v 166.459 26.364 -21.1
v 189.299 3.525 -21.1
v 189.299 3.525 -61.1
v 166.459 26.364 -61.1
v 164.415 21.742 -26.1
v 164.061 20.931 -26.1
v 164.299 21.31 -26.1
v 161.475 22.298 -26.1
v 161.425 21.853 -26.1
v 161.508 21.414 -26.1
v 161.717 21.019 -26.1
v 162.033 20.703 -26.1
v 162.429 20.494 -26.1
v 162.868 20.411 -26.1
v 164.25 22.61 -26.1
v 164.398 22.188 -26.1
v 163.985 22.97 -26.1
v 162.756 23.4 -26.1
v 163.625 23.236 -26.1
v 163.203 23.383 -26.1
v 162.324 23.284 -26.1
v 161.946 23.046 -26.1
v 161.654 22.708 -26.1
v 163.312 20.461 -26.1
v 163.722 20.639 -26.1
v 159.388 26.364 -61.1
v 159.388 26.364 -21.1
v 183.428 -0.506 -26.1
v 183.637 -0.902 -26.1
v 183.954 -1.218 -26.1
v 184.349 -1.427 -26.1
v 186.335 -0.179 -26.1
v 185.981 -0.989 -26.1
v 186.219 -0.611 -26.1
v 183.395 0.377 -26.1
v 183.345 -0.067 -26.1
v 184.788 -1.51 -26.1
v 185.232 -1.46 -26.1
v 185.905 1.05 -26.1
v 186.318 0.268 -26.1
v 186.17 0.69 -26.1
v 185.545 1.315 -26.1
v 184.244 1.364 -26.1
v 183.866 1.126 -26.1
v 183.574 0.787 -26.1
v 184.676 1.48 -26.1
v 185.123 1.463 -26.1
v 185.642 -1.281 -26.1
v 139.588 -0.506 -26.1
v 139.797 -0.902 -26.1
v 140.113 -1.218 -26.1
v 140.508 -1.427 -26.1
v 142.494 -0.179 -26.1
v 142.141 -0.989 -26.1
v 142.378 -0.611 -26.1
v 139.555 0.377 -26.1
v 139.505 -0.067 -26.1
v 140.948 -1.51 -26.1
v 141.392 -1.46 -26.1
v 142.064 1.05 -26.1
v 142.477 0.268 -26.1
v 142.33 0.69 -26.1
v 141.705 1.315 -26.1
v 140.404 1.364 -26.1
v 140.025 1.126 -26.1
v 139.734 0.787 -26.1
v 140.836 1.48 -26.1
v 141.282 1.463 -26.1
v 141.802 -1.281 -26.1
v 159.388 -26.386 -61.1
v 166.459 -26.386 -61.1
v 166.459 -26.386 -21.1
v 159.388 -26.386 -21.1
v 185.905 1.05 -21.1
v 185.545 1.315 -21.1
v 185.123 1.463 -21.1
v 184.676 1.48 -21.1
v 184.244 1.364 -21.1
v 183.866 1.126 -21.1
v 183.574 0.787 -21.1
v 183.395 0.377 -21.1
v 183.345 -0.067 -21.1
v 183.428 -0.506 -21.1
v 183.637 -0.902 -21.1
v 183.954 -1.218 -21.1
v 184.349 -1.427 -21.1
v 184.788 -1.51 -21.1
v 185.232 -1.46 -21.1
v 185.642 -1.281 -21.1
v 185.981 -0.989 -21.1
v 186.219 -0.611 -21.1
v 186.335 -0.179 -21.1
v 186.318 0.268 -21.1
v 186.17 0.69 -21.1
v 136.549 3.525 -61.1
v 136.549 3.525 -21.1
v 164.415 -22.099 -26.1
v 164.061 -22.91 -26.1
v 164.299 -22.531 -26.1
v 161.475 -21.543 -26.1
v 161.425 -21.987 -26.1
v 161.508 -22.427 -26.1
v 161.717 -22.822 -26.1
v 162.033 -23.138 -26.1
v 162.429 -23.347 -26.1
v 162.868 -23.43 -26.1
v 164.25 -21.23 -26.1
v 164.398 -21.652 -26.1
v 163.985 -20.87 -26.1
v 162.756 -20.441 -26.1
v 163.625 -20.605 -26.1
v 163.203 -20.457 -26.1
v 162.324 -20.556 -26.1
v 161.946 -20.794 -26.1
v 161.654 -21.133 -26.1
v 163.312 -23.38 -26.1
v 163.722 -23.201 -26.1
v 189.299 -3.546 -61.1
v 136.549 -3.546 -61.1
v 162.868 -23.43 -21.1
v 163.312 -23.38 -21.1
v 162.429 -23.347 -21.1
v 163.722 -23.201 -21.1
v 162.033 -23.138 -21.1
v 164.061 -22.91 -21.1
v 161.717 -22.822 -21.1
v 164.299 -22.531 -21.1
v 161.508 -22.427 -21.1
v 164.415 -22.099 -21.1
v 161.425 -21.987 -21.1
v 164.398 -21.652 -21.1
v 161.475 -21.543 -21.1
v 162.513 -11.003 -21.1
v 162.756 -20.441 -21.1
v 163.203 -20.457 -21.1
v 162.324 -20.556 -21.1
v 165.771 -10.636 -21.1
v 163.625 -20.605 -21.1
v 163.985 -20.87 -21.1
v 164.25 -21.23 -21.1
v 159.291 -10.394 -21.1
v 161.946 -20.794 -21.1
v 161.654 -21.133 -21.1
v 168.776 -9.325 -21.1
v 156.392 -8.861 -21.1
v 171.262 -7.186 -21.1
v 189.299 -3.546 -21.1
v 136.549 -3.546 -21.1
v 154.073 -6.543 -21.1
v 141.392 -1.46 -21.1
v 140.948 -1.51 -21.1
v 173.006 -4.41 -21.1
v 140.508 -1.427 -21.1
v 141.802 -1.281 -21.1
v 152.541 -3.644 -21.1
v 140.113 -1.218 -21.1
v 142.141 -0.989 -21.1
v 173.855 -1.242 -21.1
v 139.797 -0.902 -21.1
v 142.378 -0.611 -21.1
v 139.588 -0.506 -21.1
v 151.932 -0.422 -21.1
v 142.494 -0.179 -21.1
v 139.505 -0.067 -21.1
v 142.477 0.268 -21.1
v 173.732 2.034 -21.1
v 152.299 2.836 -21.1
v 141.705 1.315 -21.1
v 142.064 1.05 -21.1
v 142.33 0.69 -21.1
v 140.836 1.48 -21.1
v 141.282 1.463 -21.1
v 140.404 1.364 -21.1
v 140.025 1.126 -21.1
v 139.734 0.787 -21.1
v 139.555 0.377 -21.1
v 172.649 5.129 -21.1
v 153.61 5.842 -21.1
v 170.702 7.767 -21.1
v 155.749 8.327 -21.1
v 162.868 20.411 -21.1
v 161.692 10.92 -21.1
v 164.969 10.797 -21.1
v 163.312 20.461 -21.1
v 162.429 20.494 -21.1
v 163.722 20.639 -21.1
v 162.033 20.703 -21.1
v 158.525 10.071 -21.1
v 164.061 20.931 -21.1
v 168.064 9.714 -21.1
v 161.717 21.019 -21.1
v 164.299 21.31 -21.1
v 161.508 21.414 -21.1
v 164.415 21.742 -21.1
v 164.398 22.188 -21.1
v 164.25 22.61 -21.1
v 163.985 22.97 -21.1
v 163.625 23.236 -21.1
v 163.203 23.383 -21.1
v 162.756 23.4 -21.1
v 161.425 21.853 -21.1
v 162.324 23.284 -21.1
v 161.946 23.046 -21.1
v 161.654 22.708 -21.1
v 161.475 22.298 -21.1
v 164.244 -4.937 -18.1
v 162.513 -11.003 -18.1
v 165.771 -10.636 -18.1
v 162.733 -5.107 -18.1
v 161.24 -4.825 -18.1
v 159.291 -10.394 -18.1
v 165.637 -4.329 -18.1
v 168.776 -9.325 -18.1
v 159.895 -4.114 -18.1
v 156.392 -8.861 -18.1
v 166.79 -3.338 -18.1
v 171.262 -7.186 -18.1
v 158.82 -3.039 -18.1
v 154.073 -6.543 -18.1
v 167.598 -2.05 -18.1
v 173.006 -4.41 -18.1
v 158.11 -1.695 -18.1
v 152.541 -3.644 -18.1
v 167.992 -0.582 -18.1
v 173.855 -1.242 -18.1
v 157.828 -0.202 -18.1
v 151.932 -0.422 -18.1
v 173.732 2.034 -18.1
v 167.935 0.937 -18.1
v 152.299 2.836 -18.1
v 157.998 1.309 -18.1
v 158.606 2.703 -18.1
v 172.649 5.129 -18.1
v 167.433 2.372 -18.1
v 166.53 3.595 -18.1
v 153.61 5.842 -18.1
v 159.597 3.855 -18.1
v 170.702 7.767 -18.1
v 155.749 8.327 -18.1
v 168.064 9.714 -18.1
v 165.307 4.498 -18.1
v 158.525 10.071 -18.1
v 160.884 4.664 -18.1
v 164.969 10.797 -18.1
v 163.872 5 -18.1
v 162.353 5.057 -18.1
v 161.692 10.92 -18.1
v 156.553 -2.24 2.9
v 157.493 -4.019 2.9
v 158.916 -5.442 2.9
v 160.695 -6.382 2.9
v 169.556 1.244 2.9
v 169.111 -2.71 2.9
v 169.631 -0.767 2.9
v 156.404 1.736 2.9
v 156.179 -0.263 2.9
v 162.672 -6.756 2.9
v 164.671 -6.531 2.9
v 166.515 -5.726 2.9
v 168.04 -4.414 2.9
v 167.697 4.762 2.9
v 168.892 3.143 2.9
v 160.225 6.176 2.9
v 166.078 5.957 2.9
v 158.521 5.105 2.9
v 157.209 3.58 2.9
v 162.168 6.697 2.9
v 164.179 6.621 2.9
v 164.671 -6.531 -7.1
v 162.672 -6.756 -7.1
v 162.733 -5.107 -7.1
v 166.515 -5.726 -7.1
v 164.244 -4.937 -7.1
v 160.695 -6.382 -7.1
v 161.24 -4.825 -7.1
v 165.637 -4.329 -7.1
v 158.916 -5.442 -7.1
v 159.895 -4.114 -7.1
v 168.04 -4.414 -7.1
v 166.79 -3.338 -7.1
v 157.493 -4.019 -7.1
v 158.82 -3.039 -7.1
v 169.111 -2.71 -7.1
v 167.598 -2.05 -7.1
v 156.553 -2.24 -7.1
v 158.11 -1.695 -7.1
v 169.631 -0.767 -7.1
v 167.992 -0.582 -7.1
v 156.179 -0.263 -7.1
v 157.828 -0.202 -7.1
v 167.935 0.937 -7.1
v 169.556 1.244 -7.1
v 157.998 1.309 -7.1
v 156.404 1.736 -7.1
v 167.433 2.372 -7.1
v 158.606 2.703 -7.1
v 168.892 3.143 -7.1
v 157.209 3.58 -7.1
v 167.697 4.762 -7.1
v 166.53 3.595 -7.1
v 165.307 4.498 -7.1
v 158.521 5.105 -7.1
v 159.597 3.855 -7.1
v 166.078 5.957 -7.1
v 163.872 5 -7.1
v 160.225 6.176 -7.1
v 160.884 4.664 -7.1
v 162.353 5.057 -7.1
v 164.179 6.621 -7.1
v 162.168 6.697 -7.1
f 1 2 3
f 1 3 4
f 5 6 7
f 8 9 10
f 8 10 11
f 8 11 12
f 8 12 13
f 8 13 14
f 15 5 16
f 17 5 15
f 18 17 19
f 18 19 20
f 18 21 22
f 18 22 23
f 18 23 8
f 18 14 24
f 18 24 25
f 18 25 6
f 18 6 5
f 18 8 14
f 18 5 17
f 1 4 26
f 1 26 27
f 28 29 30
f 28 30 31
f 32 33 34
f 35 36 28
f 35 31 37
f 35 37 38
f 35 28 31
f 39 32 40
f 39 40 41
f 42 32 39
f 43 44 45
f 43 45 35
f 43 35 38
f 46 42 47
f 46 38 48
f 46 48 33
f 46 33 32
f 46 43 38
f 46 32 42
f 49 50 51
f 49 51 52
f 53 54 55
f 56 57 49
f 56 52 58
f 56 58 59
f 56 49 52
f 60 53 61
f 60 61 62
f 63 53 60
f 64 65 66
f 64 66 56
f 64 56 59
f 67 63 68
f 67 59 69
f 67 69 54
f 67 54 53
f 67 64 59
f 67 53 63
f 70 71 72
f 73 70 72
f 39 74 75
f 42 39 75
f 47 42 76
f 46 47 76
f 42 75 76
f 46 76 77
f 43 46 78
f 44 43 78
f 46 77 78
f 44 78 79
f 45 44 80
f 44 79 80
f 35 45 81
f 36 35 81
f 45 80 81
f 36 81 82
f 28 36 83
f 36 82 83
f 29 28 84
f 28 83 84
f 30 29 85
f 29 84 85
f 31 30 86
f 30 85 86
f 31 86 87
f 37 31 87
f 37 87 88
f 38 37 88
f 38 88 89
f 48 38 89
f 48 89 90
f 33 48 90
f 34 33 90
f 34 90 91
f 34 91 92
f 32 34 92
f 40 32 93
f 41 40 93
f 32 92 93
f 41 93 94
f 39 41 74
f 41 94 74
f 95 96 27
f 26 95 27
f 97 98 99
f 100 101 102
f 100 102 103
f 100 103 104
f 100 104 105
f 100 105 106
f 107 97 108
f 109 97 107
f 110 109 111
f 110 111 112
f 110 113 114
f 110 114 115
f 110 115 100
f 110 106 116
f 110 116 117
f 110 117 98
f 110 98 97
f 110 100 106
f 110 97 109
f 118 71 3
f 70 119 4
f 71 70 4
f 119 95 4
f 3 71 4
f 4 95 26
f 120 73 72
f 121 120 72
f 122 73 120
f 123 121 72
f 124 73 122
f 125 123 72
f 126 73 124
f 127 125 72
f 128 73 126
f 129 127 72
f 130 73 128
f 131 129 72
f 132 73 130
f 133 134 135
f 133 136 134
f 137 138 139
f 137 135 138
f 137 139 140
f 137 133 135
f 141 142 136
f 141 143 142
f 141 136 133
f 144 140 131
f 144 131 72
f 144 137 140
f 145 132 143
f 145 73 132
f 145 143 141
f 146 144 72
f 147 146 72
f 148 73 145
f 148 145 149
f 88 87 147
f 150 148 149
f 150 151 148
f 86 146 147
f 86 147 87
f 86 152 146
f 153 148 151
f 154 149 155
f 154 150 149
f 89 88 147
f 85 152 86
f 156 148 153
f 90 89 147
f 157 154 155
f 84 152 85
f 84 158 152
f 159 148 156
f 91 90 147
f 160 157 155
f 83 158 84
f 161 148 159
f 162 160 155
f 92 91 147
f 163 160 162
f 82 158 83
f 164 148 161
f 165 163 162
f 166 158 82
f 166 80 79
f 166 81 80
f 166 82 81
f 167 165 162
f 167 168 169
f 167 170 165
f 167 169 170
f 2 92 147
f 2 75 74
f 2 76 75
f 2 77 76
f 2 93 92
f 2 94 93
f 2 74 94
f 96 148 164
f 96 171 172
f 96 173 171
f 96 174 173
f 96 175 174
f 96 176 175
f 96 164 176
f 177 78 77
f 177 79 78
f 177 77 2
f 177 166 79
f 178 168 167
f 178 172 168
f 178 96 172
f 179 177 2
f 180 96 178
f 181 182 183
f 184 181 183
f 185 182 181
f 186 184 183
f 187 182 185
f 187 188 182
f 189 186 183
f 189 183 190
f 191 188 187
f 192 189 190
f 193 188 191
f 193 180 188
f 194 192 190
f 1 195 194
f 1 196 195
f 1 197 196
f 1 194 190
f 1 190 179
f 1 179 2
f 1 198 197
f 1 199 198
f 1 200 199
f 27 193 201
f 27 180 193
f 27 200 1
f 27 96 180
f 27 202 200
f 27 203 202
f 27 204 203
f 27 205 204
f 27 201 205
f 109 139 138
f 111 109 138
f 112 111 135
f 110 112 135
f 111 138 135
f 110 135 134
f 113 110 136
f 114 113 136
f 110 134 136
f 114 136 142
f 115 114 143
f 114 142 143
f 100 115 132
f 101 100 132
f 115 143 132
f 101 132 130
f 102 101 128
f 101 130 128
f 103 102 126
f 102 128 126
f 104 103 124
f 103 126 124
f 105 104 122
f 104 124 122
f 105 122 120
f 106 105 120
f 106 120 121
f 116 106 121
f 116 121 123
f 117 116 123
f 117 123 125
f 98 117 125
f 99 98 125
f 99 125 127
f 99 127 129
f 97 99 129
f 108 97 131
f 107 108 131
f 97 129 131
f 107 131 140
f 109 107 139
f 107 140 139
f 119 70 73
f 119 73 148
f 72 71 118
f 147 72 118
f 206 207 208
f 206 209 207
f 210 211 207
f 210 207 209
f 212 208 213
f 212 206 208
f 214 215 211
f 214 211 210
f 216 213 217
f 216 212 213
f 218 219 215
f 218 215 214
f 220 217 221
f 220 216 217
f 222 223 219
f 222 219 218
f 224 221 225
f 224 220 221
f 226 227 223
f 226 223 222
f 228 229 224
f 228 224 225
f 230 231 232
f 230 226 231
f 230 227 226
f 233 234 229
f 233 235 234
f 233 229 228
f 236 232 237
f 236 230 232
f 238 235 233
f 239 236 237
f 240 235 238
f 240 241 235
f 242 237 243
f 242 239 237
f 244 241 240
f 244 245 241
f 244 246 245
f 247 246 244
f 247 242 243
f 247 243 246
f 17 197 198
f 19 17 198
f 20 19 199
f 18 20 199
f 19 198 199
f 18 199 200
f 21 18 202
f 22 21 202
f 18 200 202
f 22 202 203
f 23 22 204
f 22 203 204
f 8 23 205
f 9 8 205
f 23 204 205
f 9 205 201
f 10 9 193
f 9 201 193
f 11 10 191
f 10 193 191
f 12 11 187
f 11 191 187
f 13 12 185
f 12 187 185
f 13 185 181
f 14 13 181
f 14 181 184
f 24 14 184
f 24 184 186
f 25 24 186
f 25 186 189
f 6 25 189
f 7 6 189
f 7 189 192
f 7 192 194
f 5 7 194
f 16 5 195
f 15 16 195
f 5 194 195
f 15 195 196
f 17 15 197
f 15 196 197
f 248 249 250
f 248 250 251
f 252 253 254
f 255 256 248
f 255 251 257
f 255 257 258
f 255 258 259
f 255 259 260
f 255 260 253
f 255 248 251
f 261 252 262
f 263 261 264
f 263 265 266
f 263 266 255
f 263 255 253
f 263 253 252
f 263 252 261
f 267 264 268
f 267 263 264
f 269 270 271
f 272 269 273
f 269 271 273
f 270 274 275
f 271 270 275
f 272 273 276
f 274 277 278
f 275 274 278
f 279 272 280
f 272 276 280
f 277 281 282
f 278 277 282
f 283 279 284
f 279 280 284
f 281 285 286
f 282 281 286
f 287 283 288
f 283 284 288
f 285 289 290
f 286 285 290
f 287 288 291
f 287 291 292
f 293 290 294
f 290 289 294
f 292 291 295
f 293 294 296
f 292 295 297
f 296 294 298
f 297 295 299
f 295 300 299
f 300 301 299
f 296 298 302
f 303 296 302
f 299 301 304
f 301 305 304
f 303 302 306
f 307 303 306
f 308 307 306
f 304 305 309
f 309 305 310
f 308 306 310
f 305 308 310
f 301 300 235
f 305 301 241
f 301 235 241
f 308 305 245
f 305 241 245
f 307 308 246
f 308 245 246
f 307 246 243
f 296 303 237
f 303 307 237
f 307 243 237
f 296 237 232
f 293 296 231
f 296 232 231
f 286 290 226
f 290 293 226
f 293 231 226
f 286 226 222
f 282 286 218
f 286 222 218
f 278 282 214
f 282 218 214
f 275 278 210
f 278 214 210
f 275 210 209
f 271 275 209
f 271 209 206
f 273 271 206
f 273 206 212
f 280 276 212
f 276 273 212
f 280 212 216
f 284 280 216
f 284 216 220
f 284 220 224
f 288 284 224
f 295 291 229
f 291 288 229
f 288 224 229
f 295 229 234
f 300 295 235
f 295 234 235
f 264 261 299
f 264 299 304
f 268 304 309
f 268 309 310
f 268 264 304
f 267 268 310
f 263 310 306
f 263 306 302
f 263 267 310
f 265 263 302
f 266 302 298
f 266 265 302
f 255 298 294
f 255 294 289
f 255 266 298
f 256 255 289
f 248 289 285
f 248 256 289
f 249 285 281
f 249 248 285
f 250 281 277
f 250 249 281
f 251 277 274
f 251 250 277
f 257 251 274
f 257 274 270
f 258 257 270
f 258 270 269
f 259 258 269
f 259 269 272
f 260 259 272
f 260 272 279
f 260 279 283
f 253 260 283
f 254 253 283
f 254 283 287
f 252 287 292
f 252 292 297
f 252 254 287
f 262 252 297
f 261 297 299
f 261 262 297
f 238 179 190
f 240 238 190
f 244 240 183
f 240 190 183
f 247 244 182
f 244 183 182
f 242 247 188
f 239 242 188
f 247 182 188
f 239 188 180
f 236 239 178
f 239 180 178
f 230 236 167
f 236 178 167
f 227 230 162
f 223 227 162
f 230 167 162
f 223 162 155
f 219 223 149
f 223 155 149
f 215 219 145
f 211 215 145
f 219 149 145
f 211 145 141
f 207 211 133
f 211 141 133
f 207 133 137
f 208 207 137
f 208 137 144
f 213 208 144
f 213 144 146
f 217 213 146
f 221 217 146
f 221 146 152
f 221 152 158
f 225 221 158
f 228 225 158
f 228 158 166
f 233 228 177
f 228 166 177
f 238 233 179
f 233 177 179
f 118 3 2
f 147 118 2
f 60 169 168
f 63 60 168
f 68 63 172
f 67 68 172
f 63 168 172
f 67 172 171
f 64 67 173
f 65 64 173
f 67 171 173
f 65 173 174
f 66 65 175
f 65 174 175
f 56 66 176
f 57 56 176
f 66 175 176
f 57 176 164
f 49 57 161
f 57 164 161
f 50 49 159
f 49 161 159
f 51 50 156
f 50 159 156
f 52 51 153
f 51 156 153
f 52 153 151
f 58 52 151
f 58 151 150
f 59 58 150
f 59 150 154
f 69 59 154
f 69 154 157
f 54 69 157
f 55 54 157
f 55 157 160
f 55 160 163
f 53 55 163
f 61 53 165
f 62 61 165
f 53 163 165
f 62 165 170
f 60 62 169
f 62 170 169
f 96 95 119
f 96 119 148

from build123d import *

# Parameters (mm, degrees)
SKETCH076_W             = 42.3
SKETCH076_H             = 42.3
PAD024_DEPTH            = 40
SKETCH075_R             = 11
PAD025_DEPTH            = 3
SKETCH077_R             = 5.1
PAD026_DEPTH            = 21
SKETCH079_R             = 1.5
POCKET047_DEPTH         = 5
CHAMFER008_SIZE         = 5
SKETCH080_R             = 6.75
PAD027_DEPTH            = 10
BODY017_PLACEMENT_ANGLE = 45


with BuildPart() as part:
    # Sketch076 → Pad024 (new body)
    with BuildSketch(Plane.XY):
        Rectangle(SKETCH076_W, SKETCH076_H)
    extrude(amount=PAD024_DEPTH)

    # Sketch075 (on Face6 of Pad024) → Pad025 (join)
    with BuildSketch(Plane.XY.offset(40)):
        Circle(SKETCH075_R)
    extrude(amount=PAD025_DEPTH)

    # Sketch077 (on Face8 of Pad025) → Pad026 (join)
    with BuildSketch(Plane.XY.offset(43)):
        Circle(SKETCH077_R)
    extrude(amount=PAD026_DEPTH)

    # Sketch079 (on Face5 of Pad026) → Pocket047 (cut)
    with BuildSketch(Plane.XY.offset(40)):
        with Locations((-15.5, 15.5)):
            Circle(SKETCH079_R)
        with Locations((15.5, 15.5)):
            Circle(SKETCH079_R)
        with Locations((15.5, -15.5)):
            Circle(SKETCH079_R)
        with Locations((-15.5, -15.5)):
            Circle(SKETCH079_R)
    extrude(amount=-POCKET047_DEPTH, mode=Mode.SUBTRACT)

    # Chamfer008
    chamfer008_edges = [part.edges().sort_by_distance(p)[0] for p in [
        (21.15, 21.15, 20),
        (21.15, -21.15, 20),
        (-21.15, 21.15, 20),
        (-21.15, -21.15, 20),
    ]]
    chamfer(chamfer008_edges, length=CHAMFER008_SIZE)

    # Sketch080 (on Face22 of Chamfer008) → Pad027 (join)
    with BuildSketch(Plane.XY.offset(64)):
        Circle(SKETCH080_R)
    extrude(amount=-PAD027_DEPTH)


with BuildPart() as part_1:
    # Body017 placement: moved
    add(part.part.moved(Location((162.9239407719, -0.0108408296, -61.1))).rotate(Axis((162.9239407719, -0.0108408296, -61.1), (0, 0, 1)), BODY017_PLACEMENT_ANGLE))


solid = part_1.part
